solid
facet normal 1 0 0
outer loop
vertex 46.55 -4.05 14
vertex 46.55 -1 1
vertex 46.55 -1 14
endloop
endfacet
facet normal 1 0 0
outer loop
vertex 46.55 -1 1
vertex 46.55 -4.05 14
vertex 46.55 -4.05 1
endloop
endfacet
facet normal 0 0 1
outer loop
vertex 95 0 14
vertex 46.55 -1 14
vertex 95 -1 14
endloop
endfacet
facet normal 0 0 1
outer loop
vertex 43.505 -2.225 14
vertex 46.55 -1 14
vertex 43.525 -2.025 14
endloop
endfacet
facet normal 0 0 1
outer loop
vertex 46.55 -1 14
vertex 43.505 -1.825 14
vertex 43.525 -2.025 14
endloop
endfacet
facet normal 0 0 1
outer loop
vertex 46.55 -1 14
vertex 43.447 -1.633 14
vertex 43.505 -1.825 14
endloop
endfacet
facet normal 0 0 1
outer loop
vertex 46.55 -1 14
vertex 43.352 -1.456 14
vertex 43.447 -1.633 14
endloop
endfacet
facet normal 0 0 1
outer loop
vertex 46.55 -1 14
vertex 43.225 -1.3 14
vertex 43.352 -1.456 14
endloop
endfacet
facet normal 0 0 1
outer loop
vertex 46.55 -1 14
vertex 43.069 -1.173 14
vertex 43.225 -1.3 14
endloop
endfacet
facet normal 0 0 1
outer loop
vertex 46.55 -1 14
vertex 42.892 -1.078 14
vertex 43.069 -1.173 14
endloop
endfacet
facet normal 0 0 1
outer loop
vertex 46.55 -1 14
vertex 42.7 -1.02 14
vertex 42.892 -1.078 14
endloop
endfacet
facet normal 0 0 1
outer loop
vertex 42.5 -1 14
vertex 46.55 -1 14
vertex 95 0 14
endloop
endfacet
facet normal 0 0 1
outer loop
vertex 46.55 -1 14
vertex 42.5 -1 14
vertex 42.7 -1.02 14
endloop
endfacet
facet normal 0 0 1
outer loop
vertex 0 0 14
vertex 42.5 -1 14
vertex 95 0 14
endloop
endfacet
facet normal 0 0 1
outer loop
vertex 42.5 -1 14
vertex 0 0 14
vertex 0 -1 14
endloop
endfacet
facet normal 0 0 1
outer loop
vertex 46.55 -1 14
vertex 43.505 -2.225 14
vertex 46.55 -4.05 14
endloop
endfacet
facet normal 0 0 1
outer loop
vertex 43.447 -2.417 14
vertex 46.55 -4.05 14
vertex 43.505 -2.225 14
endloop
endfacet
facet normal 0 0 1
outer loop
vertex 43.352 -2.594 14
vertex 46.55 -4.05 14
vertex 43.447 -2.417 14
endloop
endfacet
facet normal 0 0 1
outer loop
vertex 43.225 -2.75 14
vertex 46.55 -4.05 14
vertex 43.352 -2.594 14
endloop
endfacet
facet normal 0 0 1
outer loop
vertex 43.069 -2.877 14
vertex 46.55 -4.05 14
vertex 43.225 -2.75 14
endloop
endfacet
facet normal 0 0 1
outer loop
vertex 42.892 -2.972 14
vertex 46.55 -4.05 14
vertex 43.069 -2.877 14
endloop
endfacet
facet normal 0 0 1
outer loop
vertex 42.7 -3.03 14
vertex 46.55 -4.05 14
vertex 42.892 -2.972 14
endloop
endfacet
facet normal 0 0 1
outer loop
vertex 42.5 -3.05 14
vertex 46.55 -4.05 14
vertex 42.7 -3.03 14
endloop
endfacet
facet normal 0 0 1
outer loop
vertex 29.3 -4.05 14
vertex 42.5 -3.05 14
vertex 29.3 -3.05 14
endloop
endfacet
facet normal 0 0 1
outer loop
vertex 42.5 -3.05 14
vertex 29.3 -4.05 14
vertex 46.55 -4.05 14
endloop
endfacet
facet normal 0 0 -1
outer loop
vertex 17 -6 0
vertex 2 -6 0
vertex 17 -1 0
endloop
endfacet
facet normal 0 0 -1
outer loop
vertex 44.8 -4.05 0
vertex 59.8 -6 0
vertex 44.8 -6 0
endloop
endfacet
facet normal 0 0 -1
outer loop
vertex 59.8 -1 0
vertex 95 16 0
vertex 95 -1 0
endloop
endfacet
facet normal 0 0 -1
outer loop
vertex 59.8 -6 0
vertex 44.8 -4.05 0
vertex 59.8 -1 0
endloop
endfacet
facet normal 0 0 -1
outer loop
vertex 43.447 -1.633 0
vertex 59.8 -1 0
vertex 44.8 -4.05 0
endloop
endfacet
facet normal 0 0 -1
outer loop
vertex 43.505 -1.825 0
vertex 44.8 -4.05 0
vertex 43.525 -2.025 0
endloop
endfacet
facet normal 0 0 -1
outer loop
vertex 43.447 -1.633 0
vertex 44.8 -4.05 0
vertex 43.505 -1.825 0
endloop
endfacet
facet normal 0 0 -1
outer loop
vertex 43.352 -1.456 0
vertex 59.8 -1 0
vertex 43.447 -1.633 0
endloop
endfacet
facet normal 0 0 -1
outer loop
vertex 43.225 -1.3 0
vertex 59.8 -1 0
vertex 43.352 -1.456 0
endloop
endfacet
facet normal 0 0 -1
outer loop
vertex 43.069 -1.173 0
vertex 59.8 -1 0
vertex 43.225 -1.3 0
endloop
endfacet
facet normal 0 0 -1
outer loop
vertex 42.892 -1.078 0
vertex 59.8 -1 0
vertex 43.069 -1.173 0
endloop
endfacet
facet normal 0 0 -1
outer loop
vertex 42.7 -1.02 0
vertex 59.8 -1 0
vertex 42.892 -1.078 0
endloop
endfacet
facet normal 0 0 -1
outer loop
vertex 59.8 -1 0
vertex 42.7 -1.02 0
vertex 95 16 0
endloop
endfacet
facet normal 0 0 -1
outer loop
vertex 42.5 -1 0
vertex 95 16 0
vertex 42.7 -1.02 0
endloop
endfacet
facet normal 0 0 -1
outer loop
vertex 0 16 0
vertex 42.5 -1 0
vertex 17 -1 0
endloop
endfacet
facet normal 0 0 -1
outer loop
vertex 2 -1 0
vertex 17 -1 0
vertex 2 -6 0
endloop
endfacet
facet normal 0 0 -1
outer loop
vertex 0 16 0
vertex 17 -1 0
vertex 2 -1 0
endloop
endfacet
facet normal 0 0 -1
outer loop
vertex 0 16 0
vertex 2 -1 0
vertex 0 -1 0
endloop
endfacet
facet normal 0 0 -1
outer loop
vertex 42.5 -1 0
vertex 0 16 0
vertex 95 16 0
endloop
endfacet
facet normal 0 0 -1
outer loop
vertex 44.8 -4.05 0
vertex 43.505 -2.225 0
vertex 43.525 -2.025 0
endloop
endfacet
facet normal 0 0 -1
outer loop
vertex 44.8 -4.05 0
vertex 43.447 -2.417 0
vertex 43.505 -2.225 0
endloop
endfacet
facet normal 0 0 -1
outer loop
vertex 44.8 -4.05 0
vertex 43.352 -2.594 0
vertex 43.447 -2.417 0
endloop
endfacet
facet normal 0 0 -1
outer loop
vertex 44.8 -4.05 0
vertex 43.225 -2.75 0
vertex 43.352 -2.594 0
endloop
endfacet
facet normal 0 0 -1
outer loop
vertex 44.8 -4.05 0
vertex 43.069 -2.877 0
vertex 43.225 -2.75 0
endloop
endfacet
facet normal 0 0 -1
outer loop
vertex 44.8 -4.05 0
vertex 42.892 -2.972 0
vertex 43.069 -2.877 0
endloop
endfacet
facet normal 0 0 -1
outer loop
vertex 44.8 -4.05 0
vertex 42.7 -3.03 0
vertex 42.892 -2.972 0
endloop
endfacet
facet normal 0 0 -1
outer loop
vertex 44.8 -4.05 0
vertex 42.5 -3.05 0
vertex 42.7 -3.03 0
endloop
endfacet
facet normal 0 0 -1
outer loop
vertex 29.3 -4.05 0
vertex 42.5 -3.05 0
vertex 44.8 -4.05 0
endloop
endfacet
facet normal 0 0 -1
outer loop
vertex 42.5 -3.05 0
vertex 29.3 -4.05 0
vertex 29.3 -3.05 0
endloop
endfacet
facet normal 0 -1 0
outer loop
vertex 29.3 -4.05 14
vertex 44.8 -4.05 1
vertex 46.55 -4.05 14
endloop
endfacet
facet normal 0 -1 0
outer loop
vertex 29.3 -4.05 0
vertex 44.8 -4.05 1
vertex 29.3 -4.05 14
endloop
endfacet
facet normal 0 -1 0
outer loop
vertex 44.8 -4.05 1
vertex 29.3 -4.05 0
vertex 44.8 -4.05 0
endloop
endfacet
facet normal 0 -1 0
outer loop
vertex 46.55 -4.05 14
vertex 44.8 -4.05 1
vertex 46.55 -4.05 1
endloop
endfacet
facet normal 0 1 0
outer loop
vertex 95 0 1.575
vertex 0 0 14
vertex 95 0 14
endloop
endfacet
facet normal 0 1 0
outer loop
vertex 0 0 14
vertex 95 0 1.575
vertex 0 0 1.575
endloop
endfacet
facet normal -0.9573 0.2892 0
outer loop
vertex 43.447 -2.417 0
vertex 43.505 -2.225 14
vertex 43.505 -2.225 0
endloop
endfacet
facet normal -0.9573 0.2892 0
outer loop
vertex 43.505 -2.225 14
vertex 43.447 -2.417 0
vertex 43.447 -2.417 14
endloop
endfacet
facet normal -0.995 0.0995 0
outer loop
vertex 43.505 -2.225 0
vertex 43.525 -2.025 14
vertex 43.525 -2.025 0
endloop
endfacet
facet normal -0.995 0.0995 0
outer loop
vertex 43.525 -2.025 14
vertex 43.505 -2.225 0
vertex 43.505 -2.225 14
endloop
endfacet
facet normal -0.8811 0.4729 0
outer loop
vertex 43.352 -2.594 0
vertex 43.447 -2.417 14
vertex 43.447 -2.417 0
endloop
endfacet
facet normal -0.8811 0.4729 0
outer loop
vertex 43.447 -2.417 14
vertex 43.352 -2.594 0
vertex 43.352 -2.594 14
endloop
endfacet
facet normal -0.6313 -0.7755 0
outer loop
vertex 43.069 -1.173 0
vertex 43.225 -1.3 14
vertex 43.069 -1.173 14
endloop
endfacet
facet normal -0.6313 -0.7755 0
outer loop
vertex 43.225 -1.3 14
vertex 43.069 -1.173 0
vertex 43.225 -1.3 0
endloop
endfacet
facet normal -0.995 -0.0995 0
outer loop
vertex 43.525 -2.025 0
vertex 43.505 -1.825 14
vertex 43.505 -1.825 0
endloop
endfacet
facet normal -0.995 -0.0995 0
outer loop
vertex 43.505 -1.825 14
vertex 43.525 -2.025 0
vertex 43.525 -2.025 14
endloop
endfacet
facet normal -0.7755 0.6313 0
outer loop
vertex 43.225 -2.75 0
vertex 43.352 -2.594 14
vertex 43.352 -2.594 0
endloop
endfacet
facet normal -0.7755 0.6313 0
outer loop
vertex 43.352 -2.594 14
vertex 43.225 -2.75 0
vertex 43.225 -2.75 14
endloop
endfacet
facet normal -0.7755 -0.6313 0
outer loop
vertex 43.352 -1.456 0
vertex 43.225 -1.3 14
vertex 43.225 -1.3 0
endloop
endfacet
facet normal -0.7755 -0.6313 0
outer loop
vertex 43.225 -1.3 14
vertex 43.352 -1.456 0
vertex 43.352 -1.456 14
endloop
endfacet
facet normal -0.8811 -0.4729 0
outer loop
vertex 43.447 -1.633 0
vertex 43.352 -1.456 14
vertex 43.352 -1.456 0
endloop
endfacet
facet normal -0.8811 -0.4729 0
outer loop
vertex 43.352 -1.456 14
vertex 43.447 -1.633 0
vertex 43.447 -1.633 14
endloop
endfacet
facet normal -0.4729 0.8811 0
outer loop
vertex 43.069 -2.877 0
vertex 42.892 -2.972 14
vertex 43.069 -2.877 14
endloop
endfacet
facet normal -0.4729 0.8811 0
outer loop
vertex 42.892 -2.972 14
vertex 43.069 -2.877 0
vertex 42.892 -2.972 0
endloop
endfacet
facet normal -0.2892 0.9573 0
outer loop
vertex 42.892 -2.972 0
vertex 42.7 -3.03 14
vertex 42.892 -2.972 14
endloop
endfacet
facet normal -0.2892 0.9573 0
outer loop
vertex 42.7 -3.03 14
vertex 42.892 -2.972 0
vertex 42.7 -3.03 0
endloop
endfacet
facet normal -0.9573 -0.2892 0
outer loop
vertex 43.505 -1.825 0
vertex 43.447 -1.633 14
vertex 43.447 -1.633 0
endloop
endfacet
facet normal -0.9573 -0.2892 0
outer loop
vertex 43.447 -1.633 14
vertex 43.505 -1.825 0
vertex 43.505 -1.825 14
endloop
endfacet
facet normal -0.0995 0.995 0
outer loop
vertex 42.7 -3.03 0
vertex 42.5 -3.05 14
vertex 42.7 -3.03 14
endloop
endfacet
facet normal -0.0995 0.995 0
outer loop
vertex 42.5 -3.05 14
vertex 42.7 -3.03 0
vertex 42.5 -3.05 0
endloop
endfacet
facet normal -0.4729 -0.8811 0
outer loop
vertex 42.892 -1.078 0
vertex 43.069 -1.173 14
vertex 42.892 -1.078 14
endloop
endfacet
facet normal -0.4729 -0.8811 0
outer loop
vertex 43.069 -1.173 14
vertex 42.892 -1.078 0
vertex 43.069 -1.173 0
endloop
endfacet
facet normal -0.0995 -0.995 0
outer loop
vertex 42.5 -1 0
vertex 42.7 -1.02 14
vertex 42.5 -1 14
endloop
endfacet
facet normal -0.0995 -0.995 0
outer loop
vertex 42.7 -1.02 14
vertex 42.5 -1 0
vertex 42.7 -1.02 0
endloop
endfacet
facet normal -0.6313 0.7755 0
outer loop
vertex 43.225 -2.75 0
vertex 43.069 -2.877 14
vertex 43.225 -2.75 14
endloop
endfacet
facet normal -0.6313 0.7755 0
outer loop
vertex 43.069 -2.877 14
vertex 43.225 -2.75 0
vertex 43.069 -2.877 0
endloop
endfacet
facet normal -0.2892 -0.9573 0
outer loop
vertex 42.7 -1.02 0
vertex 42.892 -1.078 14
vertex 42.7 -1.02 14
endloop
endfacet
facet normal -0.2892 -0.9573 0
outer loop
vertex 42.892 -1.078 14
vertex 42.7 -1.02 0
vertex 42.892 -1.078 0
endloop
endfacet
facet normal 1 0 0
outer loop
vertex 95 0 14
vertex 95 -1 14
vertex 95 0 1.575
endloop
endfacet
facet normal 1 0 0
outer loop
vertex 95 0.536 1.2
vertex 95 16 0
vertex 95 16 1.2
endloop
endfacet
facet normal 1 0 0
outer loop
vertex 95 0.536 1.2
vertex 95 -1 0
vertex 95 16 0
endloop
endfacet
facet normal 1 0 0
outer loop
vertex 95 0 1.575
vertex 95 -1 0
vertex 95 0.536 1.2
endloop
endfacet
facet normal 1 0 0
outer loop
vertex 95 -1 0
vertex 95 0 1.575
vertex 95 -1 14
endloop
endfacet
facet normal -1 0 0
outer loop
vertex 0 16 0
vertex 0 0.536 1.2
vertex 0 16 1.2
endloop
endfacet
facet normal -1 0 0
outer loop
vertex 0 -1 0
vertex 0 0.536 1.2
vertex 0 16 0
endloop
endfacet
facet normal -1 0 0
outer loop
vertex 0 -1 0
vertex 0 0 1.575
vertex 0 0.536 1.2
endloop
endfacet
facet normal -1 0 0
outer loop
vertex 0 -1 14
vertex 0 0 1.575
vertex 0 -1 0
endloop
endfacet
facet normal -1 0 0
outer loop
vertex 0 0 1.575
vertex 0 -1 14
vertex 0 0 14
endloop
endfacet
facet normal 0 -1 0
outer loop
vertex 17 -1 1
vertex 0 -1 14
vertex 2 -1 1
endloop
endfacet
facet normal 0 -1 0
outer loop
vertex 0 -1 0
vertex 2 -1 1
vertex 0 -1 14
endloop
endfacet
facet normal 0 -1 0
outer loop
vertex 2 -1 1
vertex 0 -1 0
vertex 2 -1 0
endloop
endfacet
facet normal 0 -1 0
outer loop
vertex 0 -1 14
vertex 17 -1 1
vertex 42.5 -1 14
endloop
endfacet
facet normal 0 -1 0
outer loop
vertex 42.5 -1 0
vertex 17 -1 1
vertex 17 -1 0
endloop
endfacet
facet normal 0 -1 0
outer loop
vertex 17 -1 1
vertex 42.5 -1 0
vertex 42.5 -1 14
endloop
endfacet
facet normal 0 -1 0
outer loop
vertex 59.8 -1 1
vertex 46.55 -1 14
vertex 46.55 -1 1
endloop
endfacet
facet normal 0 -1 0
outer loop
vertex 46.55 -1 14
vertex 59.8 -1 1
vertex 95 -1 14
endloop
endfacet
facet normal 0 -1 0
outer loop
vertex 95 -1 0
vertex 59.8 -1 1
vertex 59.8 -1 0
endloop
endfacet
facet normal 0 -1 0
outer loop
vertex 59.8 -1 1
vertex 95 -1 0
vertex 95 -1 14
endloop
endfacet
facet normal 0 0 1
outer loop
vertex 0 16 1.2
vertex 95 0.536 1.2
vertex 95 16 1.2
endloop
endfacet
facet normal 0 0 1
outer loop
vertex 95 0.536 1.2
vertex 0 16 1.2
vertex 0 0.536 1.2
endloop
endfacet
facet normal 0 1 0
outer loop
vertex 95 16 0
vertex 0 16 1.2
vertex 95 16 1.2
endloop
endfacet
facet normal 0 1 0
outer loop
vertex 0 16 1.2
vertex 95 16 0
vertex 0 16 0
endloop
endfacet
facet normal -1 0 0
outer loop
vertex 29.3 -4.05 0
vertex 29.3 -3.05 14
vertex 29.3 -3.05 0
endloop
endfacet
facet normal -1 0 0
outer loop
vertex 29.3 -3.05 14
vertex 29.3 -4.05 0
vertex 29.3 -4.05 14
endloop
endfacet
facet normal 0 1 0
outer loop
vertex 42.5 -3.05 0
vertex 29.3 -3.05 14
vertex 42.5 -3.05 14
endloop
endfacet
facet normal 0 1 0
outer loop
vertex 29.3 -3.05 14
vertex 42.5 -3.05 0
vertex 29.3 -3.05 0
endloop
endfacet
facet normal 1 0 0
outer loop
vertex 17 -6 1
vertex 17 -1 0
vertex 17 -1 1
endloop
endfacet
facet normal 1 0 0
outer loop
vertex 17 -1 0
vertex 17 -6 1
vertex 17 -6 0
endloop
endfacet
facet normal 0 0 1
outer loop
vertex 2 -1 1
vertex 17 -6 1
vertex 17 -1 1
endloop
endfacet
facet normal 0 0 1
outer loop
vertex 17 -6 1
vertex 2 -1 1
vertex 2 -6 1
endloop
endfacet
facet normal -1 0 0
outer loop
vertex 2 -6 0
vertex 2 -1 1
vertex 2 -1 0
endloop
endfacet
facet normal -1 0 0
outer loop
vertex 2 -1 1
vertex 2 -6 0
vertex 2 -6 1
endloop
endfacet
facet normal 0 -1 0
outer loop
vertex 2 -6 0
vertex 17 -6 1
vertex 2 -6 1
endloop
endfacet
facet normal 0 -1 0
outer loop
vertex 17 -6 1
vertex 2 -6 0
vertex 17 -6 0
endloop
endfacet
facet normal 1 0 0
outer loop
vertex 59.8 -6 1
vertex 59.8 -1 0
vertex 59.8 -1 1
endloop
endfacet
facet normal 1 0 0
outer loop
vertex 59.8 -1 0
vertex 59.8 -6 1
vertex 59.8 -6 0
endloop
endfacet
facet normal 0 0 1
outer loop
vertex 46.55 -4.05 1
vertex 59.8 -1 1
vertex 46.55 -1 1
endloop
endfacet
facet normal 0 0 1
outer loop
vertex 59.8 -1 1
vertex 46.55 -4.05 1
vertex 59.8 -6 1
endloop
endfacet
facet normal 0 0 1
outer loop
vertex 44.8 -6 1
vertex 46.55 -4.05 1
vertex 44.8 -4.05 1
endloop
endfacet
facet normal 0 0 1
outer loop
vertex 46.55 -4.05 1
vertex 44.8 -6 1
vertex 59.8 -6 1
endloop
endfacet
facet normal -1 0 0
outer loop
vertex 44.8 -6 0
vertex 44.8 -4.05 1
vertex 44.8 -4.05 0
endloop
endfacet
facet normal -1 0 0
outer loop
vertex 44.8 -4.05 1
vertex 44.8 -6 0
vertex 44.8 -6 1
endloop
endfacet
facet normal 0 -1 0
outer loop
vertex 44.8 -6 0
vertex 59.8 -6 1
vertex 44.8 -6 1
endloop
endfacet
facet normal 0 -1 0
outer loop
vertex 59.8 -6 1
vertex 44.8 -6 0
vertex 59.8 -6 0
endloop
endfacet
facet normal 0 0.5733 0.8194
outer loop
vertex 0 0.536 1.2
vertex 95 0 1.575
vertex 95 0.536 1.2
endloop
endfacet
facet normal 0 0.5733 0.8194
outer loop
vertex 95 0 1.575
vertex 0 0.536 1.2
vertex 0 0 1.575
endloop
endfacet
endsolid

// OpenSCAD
//////////////////////////////////////////////////////////////////////////////////////
///
///  FLEXBATTER: Flexing battery holder with built-in spring
///
///  This file generates battery holders for arbitrary cylindrical sizes.
///  The number of batteries and their size is fully parametrized.
///
///  The usual metallic spring at the minus pole is replaced by a
///  flexible printed spring, which is pressing the contacts firmly to 
///  the battery.
///
///  The contacts for the plus and minus pole can easily be made by
///  a few windings of the uninsulated ends of the connecting wires.
///  Each battery compartment contains are several holes to the outside
///  as well ad to the neighboring compartments, through which connecting
///  wires can be passed for easy configuring of parallel, serial or
///  balanced-serial battery packs.
///  
///  The preconfigured battery sizes are:
///  AA, AAA, C, D, 18650(Li-Ion), 18650P(protected Li-Ion), CR123A(16340)
///  
///  Given that the printed plastic spring needs to be flexible, ABS is the material
///  of choice here.
///
//////////////////////////////////////////////////////////////////////////////////////
///
///  2014-09-09 Heinz Spiess, Switzerland
///
///  released under Creative Commons - Attribution - Share Alike licence (CC BY-SA)
//////////////////////////////////////////////////////////////////////////////////////

// build a cube with chamfered edges
module chamfered_cube(size,d=1){
   hull(){
     translate([d,d,0])cube(size-2*[d,d,0]);
     translate([0,d,d])cube(size-2*[0,d,d]);
     translate([d,0,d])cube(size-2*[d,0,d]);
   }
}


// draw an arc width height h between radius r1..r2 and angles a1..a2
module arc(r1,r2,h,a1=0,a2=0){
     if(a2-a1<=180){
        difference(){
           cylinder(r=r2,h=h);
           translate([0,0,-1])cylinder(r=r1,h=h+2);
	   rotate(a2)translate([-r1-r2,0,-1])cube([2*(r1+r2),2*(r1+r2),h+2]);
	   rotate(a1+180)translate([-r1-r2,0,-1])cube([2*(r1+r2),2*(r1+r2),h+2]);
        }
     } else {
           difference(){
              cylinder(r=r2,h=h);
              translate([0,0,-1])cylinder(r=r1,h=h+2);
              intersection(){
	       rotate(a2)translate([-r1-r2,0,-1])cube([2*(r1+r2),2*(r1+r2),h+2]);
	       rotate(a1+180)translate([-r1-r2,0,-1])cube([2*(r1+r2),2*(r1+r2),h+2]);
	      }
           }
     }
}

/////////////////////////////////////////////////////////////////////////////////
// sline - generate a "snake line" of width w and height h 
// with a arbitrary sequence of segments defined by a radius and a turning angle
//
//   angle[i] > 0  left turn / counter-clockwise
//   angle[i] < 0  left turn / clockwise
//   angle[i] = 0  straight segment with length radius[i]
//
/////////////////////////////////////////////////////////////////////////////////
// Heinz Spiess, 2014-09-06 (CC BY-SA)
/////////////////////////////////////////////////////////////////////////////////
module sline(angle,radius,i,w,h){
   scale([angle[i]>=0?1:-1,1,1])
      assign(r=abs(radius[i]))assign(a=angle[i])
         translate([a?r:0,0,0]){
	    translate([-w/2,-r-0.01,0])cube([w,0.02,h]); // tiny overlap!
            if(a)arc(r-w/2,r+w/2,0,a,h=h);
	    else if(r>0)translate([-w/2,-r,0])cube([w,r,h]);
      if(i+1<len(angle))
           rotate(angle[i])
	      translate([a?-r:0,a?0:-r,0])
	         sline(angle,radius,i+1,w,h);
  }
}


module rackhook(){
  raillen=75;
  xtraraillen=20;
  railh=14;
  railth=1;
  restth=1.2;
  restde=16;
  pegw=11;
  pegth=1.95;//1.8
  flapw=30;
  flaph=14;
  flapth=1;
  hookth=1;
  hookw=pegw*1.2;
  hookgap=pegth+0.1;
  spineth=flapth+hookgap+hookth;
  xofs=-10;


	//rail
	cube([raillen+xtraraillen,railth,railh]);
  //extrarail front
	//rest
	translate([0,-restde,0]) cube([raillen+xtraraillen,restde,restth]);
  //outer plate
  translate([(raillen/2-flapw/2),0,0]) cube([flapw,flapth,flaph]);
  //hook
  translate([(raillen/2-flapw/2)+flapw-hookw+xofs,flapth+hookgap,0]) cube([hookw,flapth,flaph]);

	difference(){
	   union(){		
		  //spine of hook 
		  translate([(raillen/2+flapw/2)+xofs,0,0]) cube([spineth,spineth,flaph]);
	   }//union
	 //rounder of spine
	 translate([(raillen/2+flapw/2)+xofs,railth+hookgap/2,-0.05]) cylinder(d=hookgap,h=flaph+0.1,$fn=32);
  }//difference
  //inflaps 
  flapofs1=2;  
  flapofs2=hookw+2;
  flaplen=raillen*0.2;
  flapde=5;//restde*0.4;
	translate([flapofs1,railth,0]) cube([flaplen,flapde,railth]);
	translate([raillen-flapofs2-flaplen,railth,0]) cube([flaplen,flapde,railth]);
  translate([0,-0.1,1.2]) #rotate([0,90,0]) rotate([0,0,275]) cylinder(d=1,h=raillen+xtraraillen,$fn=3);
//chamfered_cube([flaplen,flapde,railth],d=0.1);
//cube([flaplen,flapde,railth]);
}
//rackhook();
mirror ([0,1,0]) rackhook();

// uncomment as needed:

//flexbatterCR123A(n=2);
//rotate([0,0,0])translate([0,0,-9])flexbatter18650(n=1);
//translate([0,40,0])rotate([90,0,0])translate([0,0,-9])flexbatter18650(n=1);
//translate([0,80,0])rotate([180,0,0])translate([0,0,-9])flexbatter18650(n=1);
//translate([0,120,0])rotate([-90,0,0])translate([0,0,-9])flexbatter18650(n=1);
//translate([0,33,0])flexbatter18650(n=2);
//translate([0,90,0])flexbatter18650(n=3);
//translate([-90,33,0])flexbatter18650(n=4);
//translate([0,28,0])flexbatterAA(n=2);
//translate([0,50,0])flexbatterAAA(n=1);
//flexbatterC(n=1);
//flexbatterD(n=1);
